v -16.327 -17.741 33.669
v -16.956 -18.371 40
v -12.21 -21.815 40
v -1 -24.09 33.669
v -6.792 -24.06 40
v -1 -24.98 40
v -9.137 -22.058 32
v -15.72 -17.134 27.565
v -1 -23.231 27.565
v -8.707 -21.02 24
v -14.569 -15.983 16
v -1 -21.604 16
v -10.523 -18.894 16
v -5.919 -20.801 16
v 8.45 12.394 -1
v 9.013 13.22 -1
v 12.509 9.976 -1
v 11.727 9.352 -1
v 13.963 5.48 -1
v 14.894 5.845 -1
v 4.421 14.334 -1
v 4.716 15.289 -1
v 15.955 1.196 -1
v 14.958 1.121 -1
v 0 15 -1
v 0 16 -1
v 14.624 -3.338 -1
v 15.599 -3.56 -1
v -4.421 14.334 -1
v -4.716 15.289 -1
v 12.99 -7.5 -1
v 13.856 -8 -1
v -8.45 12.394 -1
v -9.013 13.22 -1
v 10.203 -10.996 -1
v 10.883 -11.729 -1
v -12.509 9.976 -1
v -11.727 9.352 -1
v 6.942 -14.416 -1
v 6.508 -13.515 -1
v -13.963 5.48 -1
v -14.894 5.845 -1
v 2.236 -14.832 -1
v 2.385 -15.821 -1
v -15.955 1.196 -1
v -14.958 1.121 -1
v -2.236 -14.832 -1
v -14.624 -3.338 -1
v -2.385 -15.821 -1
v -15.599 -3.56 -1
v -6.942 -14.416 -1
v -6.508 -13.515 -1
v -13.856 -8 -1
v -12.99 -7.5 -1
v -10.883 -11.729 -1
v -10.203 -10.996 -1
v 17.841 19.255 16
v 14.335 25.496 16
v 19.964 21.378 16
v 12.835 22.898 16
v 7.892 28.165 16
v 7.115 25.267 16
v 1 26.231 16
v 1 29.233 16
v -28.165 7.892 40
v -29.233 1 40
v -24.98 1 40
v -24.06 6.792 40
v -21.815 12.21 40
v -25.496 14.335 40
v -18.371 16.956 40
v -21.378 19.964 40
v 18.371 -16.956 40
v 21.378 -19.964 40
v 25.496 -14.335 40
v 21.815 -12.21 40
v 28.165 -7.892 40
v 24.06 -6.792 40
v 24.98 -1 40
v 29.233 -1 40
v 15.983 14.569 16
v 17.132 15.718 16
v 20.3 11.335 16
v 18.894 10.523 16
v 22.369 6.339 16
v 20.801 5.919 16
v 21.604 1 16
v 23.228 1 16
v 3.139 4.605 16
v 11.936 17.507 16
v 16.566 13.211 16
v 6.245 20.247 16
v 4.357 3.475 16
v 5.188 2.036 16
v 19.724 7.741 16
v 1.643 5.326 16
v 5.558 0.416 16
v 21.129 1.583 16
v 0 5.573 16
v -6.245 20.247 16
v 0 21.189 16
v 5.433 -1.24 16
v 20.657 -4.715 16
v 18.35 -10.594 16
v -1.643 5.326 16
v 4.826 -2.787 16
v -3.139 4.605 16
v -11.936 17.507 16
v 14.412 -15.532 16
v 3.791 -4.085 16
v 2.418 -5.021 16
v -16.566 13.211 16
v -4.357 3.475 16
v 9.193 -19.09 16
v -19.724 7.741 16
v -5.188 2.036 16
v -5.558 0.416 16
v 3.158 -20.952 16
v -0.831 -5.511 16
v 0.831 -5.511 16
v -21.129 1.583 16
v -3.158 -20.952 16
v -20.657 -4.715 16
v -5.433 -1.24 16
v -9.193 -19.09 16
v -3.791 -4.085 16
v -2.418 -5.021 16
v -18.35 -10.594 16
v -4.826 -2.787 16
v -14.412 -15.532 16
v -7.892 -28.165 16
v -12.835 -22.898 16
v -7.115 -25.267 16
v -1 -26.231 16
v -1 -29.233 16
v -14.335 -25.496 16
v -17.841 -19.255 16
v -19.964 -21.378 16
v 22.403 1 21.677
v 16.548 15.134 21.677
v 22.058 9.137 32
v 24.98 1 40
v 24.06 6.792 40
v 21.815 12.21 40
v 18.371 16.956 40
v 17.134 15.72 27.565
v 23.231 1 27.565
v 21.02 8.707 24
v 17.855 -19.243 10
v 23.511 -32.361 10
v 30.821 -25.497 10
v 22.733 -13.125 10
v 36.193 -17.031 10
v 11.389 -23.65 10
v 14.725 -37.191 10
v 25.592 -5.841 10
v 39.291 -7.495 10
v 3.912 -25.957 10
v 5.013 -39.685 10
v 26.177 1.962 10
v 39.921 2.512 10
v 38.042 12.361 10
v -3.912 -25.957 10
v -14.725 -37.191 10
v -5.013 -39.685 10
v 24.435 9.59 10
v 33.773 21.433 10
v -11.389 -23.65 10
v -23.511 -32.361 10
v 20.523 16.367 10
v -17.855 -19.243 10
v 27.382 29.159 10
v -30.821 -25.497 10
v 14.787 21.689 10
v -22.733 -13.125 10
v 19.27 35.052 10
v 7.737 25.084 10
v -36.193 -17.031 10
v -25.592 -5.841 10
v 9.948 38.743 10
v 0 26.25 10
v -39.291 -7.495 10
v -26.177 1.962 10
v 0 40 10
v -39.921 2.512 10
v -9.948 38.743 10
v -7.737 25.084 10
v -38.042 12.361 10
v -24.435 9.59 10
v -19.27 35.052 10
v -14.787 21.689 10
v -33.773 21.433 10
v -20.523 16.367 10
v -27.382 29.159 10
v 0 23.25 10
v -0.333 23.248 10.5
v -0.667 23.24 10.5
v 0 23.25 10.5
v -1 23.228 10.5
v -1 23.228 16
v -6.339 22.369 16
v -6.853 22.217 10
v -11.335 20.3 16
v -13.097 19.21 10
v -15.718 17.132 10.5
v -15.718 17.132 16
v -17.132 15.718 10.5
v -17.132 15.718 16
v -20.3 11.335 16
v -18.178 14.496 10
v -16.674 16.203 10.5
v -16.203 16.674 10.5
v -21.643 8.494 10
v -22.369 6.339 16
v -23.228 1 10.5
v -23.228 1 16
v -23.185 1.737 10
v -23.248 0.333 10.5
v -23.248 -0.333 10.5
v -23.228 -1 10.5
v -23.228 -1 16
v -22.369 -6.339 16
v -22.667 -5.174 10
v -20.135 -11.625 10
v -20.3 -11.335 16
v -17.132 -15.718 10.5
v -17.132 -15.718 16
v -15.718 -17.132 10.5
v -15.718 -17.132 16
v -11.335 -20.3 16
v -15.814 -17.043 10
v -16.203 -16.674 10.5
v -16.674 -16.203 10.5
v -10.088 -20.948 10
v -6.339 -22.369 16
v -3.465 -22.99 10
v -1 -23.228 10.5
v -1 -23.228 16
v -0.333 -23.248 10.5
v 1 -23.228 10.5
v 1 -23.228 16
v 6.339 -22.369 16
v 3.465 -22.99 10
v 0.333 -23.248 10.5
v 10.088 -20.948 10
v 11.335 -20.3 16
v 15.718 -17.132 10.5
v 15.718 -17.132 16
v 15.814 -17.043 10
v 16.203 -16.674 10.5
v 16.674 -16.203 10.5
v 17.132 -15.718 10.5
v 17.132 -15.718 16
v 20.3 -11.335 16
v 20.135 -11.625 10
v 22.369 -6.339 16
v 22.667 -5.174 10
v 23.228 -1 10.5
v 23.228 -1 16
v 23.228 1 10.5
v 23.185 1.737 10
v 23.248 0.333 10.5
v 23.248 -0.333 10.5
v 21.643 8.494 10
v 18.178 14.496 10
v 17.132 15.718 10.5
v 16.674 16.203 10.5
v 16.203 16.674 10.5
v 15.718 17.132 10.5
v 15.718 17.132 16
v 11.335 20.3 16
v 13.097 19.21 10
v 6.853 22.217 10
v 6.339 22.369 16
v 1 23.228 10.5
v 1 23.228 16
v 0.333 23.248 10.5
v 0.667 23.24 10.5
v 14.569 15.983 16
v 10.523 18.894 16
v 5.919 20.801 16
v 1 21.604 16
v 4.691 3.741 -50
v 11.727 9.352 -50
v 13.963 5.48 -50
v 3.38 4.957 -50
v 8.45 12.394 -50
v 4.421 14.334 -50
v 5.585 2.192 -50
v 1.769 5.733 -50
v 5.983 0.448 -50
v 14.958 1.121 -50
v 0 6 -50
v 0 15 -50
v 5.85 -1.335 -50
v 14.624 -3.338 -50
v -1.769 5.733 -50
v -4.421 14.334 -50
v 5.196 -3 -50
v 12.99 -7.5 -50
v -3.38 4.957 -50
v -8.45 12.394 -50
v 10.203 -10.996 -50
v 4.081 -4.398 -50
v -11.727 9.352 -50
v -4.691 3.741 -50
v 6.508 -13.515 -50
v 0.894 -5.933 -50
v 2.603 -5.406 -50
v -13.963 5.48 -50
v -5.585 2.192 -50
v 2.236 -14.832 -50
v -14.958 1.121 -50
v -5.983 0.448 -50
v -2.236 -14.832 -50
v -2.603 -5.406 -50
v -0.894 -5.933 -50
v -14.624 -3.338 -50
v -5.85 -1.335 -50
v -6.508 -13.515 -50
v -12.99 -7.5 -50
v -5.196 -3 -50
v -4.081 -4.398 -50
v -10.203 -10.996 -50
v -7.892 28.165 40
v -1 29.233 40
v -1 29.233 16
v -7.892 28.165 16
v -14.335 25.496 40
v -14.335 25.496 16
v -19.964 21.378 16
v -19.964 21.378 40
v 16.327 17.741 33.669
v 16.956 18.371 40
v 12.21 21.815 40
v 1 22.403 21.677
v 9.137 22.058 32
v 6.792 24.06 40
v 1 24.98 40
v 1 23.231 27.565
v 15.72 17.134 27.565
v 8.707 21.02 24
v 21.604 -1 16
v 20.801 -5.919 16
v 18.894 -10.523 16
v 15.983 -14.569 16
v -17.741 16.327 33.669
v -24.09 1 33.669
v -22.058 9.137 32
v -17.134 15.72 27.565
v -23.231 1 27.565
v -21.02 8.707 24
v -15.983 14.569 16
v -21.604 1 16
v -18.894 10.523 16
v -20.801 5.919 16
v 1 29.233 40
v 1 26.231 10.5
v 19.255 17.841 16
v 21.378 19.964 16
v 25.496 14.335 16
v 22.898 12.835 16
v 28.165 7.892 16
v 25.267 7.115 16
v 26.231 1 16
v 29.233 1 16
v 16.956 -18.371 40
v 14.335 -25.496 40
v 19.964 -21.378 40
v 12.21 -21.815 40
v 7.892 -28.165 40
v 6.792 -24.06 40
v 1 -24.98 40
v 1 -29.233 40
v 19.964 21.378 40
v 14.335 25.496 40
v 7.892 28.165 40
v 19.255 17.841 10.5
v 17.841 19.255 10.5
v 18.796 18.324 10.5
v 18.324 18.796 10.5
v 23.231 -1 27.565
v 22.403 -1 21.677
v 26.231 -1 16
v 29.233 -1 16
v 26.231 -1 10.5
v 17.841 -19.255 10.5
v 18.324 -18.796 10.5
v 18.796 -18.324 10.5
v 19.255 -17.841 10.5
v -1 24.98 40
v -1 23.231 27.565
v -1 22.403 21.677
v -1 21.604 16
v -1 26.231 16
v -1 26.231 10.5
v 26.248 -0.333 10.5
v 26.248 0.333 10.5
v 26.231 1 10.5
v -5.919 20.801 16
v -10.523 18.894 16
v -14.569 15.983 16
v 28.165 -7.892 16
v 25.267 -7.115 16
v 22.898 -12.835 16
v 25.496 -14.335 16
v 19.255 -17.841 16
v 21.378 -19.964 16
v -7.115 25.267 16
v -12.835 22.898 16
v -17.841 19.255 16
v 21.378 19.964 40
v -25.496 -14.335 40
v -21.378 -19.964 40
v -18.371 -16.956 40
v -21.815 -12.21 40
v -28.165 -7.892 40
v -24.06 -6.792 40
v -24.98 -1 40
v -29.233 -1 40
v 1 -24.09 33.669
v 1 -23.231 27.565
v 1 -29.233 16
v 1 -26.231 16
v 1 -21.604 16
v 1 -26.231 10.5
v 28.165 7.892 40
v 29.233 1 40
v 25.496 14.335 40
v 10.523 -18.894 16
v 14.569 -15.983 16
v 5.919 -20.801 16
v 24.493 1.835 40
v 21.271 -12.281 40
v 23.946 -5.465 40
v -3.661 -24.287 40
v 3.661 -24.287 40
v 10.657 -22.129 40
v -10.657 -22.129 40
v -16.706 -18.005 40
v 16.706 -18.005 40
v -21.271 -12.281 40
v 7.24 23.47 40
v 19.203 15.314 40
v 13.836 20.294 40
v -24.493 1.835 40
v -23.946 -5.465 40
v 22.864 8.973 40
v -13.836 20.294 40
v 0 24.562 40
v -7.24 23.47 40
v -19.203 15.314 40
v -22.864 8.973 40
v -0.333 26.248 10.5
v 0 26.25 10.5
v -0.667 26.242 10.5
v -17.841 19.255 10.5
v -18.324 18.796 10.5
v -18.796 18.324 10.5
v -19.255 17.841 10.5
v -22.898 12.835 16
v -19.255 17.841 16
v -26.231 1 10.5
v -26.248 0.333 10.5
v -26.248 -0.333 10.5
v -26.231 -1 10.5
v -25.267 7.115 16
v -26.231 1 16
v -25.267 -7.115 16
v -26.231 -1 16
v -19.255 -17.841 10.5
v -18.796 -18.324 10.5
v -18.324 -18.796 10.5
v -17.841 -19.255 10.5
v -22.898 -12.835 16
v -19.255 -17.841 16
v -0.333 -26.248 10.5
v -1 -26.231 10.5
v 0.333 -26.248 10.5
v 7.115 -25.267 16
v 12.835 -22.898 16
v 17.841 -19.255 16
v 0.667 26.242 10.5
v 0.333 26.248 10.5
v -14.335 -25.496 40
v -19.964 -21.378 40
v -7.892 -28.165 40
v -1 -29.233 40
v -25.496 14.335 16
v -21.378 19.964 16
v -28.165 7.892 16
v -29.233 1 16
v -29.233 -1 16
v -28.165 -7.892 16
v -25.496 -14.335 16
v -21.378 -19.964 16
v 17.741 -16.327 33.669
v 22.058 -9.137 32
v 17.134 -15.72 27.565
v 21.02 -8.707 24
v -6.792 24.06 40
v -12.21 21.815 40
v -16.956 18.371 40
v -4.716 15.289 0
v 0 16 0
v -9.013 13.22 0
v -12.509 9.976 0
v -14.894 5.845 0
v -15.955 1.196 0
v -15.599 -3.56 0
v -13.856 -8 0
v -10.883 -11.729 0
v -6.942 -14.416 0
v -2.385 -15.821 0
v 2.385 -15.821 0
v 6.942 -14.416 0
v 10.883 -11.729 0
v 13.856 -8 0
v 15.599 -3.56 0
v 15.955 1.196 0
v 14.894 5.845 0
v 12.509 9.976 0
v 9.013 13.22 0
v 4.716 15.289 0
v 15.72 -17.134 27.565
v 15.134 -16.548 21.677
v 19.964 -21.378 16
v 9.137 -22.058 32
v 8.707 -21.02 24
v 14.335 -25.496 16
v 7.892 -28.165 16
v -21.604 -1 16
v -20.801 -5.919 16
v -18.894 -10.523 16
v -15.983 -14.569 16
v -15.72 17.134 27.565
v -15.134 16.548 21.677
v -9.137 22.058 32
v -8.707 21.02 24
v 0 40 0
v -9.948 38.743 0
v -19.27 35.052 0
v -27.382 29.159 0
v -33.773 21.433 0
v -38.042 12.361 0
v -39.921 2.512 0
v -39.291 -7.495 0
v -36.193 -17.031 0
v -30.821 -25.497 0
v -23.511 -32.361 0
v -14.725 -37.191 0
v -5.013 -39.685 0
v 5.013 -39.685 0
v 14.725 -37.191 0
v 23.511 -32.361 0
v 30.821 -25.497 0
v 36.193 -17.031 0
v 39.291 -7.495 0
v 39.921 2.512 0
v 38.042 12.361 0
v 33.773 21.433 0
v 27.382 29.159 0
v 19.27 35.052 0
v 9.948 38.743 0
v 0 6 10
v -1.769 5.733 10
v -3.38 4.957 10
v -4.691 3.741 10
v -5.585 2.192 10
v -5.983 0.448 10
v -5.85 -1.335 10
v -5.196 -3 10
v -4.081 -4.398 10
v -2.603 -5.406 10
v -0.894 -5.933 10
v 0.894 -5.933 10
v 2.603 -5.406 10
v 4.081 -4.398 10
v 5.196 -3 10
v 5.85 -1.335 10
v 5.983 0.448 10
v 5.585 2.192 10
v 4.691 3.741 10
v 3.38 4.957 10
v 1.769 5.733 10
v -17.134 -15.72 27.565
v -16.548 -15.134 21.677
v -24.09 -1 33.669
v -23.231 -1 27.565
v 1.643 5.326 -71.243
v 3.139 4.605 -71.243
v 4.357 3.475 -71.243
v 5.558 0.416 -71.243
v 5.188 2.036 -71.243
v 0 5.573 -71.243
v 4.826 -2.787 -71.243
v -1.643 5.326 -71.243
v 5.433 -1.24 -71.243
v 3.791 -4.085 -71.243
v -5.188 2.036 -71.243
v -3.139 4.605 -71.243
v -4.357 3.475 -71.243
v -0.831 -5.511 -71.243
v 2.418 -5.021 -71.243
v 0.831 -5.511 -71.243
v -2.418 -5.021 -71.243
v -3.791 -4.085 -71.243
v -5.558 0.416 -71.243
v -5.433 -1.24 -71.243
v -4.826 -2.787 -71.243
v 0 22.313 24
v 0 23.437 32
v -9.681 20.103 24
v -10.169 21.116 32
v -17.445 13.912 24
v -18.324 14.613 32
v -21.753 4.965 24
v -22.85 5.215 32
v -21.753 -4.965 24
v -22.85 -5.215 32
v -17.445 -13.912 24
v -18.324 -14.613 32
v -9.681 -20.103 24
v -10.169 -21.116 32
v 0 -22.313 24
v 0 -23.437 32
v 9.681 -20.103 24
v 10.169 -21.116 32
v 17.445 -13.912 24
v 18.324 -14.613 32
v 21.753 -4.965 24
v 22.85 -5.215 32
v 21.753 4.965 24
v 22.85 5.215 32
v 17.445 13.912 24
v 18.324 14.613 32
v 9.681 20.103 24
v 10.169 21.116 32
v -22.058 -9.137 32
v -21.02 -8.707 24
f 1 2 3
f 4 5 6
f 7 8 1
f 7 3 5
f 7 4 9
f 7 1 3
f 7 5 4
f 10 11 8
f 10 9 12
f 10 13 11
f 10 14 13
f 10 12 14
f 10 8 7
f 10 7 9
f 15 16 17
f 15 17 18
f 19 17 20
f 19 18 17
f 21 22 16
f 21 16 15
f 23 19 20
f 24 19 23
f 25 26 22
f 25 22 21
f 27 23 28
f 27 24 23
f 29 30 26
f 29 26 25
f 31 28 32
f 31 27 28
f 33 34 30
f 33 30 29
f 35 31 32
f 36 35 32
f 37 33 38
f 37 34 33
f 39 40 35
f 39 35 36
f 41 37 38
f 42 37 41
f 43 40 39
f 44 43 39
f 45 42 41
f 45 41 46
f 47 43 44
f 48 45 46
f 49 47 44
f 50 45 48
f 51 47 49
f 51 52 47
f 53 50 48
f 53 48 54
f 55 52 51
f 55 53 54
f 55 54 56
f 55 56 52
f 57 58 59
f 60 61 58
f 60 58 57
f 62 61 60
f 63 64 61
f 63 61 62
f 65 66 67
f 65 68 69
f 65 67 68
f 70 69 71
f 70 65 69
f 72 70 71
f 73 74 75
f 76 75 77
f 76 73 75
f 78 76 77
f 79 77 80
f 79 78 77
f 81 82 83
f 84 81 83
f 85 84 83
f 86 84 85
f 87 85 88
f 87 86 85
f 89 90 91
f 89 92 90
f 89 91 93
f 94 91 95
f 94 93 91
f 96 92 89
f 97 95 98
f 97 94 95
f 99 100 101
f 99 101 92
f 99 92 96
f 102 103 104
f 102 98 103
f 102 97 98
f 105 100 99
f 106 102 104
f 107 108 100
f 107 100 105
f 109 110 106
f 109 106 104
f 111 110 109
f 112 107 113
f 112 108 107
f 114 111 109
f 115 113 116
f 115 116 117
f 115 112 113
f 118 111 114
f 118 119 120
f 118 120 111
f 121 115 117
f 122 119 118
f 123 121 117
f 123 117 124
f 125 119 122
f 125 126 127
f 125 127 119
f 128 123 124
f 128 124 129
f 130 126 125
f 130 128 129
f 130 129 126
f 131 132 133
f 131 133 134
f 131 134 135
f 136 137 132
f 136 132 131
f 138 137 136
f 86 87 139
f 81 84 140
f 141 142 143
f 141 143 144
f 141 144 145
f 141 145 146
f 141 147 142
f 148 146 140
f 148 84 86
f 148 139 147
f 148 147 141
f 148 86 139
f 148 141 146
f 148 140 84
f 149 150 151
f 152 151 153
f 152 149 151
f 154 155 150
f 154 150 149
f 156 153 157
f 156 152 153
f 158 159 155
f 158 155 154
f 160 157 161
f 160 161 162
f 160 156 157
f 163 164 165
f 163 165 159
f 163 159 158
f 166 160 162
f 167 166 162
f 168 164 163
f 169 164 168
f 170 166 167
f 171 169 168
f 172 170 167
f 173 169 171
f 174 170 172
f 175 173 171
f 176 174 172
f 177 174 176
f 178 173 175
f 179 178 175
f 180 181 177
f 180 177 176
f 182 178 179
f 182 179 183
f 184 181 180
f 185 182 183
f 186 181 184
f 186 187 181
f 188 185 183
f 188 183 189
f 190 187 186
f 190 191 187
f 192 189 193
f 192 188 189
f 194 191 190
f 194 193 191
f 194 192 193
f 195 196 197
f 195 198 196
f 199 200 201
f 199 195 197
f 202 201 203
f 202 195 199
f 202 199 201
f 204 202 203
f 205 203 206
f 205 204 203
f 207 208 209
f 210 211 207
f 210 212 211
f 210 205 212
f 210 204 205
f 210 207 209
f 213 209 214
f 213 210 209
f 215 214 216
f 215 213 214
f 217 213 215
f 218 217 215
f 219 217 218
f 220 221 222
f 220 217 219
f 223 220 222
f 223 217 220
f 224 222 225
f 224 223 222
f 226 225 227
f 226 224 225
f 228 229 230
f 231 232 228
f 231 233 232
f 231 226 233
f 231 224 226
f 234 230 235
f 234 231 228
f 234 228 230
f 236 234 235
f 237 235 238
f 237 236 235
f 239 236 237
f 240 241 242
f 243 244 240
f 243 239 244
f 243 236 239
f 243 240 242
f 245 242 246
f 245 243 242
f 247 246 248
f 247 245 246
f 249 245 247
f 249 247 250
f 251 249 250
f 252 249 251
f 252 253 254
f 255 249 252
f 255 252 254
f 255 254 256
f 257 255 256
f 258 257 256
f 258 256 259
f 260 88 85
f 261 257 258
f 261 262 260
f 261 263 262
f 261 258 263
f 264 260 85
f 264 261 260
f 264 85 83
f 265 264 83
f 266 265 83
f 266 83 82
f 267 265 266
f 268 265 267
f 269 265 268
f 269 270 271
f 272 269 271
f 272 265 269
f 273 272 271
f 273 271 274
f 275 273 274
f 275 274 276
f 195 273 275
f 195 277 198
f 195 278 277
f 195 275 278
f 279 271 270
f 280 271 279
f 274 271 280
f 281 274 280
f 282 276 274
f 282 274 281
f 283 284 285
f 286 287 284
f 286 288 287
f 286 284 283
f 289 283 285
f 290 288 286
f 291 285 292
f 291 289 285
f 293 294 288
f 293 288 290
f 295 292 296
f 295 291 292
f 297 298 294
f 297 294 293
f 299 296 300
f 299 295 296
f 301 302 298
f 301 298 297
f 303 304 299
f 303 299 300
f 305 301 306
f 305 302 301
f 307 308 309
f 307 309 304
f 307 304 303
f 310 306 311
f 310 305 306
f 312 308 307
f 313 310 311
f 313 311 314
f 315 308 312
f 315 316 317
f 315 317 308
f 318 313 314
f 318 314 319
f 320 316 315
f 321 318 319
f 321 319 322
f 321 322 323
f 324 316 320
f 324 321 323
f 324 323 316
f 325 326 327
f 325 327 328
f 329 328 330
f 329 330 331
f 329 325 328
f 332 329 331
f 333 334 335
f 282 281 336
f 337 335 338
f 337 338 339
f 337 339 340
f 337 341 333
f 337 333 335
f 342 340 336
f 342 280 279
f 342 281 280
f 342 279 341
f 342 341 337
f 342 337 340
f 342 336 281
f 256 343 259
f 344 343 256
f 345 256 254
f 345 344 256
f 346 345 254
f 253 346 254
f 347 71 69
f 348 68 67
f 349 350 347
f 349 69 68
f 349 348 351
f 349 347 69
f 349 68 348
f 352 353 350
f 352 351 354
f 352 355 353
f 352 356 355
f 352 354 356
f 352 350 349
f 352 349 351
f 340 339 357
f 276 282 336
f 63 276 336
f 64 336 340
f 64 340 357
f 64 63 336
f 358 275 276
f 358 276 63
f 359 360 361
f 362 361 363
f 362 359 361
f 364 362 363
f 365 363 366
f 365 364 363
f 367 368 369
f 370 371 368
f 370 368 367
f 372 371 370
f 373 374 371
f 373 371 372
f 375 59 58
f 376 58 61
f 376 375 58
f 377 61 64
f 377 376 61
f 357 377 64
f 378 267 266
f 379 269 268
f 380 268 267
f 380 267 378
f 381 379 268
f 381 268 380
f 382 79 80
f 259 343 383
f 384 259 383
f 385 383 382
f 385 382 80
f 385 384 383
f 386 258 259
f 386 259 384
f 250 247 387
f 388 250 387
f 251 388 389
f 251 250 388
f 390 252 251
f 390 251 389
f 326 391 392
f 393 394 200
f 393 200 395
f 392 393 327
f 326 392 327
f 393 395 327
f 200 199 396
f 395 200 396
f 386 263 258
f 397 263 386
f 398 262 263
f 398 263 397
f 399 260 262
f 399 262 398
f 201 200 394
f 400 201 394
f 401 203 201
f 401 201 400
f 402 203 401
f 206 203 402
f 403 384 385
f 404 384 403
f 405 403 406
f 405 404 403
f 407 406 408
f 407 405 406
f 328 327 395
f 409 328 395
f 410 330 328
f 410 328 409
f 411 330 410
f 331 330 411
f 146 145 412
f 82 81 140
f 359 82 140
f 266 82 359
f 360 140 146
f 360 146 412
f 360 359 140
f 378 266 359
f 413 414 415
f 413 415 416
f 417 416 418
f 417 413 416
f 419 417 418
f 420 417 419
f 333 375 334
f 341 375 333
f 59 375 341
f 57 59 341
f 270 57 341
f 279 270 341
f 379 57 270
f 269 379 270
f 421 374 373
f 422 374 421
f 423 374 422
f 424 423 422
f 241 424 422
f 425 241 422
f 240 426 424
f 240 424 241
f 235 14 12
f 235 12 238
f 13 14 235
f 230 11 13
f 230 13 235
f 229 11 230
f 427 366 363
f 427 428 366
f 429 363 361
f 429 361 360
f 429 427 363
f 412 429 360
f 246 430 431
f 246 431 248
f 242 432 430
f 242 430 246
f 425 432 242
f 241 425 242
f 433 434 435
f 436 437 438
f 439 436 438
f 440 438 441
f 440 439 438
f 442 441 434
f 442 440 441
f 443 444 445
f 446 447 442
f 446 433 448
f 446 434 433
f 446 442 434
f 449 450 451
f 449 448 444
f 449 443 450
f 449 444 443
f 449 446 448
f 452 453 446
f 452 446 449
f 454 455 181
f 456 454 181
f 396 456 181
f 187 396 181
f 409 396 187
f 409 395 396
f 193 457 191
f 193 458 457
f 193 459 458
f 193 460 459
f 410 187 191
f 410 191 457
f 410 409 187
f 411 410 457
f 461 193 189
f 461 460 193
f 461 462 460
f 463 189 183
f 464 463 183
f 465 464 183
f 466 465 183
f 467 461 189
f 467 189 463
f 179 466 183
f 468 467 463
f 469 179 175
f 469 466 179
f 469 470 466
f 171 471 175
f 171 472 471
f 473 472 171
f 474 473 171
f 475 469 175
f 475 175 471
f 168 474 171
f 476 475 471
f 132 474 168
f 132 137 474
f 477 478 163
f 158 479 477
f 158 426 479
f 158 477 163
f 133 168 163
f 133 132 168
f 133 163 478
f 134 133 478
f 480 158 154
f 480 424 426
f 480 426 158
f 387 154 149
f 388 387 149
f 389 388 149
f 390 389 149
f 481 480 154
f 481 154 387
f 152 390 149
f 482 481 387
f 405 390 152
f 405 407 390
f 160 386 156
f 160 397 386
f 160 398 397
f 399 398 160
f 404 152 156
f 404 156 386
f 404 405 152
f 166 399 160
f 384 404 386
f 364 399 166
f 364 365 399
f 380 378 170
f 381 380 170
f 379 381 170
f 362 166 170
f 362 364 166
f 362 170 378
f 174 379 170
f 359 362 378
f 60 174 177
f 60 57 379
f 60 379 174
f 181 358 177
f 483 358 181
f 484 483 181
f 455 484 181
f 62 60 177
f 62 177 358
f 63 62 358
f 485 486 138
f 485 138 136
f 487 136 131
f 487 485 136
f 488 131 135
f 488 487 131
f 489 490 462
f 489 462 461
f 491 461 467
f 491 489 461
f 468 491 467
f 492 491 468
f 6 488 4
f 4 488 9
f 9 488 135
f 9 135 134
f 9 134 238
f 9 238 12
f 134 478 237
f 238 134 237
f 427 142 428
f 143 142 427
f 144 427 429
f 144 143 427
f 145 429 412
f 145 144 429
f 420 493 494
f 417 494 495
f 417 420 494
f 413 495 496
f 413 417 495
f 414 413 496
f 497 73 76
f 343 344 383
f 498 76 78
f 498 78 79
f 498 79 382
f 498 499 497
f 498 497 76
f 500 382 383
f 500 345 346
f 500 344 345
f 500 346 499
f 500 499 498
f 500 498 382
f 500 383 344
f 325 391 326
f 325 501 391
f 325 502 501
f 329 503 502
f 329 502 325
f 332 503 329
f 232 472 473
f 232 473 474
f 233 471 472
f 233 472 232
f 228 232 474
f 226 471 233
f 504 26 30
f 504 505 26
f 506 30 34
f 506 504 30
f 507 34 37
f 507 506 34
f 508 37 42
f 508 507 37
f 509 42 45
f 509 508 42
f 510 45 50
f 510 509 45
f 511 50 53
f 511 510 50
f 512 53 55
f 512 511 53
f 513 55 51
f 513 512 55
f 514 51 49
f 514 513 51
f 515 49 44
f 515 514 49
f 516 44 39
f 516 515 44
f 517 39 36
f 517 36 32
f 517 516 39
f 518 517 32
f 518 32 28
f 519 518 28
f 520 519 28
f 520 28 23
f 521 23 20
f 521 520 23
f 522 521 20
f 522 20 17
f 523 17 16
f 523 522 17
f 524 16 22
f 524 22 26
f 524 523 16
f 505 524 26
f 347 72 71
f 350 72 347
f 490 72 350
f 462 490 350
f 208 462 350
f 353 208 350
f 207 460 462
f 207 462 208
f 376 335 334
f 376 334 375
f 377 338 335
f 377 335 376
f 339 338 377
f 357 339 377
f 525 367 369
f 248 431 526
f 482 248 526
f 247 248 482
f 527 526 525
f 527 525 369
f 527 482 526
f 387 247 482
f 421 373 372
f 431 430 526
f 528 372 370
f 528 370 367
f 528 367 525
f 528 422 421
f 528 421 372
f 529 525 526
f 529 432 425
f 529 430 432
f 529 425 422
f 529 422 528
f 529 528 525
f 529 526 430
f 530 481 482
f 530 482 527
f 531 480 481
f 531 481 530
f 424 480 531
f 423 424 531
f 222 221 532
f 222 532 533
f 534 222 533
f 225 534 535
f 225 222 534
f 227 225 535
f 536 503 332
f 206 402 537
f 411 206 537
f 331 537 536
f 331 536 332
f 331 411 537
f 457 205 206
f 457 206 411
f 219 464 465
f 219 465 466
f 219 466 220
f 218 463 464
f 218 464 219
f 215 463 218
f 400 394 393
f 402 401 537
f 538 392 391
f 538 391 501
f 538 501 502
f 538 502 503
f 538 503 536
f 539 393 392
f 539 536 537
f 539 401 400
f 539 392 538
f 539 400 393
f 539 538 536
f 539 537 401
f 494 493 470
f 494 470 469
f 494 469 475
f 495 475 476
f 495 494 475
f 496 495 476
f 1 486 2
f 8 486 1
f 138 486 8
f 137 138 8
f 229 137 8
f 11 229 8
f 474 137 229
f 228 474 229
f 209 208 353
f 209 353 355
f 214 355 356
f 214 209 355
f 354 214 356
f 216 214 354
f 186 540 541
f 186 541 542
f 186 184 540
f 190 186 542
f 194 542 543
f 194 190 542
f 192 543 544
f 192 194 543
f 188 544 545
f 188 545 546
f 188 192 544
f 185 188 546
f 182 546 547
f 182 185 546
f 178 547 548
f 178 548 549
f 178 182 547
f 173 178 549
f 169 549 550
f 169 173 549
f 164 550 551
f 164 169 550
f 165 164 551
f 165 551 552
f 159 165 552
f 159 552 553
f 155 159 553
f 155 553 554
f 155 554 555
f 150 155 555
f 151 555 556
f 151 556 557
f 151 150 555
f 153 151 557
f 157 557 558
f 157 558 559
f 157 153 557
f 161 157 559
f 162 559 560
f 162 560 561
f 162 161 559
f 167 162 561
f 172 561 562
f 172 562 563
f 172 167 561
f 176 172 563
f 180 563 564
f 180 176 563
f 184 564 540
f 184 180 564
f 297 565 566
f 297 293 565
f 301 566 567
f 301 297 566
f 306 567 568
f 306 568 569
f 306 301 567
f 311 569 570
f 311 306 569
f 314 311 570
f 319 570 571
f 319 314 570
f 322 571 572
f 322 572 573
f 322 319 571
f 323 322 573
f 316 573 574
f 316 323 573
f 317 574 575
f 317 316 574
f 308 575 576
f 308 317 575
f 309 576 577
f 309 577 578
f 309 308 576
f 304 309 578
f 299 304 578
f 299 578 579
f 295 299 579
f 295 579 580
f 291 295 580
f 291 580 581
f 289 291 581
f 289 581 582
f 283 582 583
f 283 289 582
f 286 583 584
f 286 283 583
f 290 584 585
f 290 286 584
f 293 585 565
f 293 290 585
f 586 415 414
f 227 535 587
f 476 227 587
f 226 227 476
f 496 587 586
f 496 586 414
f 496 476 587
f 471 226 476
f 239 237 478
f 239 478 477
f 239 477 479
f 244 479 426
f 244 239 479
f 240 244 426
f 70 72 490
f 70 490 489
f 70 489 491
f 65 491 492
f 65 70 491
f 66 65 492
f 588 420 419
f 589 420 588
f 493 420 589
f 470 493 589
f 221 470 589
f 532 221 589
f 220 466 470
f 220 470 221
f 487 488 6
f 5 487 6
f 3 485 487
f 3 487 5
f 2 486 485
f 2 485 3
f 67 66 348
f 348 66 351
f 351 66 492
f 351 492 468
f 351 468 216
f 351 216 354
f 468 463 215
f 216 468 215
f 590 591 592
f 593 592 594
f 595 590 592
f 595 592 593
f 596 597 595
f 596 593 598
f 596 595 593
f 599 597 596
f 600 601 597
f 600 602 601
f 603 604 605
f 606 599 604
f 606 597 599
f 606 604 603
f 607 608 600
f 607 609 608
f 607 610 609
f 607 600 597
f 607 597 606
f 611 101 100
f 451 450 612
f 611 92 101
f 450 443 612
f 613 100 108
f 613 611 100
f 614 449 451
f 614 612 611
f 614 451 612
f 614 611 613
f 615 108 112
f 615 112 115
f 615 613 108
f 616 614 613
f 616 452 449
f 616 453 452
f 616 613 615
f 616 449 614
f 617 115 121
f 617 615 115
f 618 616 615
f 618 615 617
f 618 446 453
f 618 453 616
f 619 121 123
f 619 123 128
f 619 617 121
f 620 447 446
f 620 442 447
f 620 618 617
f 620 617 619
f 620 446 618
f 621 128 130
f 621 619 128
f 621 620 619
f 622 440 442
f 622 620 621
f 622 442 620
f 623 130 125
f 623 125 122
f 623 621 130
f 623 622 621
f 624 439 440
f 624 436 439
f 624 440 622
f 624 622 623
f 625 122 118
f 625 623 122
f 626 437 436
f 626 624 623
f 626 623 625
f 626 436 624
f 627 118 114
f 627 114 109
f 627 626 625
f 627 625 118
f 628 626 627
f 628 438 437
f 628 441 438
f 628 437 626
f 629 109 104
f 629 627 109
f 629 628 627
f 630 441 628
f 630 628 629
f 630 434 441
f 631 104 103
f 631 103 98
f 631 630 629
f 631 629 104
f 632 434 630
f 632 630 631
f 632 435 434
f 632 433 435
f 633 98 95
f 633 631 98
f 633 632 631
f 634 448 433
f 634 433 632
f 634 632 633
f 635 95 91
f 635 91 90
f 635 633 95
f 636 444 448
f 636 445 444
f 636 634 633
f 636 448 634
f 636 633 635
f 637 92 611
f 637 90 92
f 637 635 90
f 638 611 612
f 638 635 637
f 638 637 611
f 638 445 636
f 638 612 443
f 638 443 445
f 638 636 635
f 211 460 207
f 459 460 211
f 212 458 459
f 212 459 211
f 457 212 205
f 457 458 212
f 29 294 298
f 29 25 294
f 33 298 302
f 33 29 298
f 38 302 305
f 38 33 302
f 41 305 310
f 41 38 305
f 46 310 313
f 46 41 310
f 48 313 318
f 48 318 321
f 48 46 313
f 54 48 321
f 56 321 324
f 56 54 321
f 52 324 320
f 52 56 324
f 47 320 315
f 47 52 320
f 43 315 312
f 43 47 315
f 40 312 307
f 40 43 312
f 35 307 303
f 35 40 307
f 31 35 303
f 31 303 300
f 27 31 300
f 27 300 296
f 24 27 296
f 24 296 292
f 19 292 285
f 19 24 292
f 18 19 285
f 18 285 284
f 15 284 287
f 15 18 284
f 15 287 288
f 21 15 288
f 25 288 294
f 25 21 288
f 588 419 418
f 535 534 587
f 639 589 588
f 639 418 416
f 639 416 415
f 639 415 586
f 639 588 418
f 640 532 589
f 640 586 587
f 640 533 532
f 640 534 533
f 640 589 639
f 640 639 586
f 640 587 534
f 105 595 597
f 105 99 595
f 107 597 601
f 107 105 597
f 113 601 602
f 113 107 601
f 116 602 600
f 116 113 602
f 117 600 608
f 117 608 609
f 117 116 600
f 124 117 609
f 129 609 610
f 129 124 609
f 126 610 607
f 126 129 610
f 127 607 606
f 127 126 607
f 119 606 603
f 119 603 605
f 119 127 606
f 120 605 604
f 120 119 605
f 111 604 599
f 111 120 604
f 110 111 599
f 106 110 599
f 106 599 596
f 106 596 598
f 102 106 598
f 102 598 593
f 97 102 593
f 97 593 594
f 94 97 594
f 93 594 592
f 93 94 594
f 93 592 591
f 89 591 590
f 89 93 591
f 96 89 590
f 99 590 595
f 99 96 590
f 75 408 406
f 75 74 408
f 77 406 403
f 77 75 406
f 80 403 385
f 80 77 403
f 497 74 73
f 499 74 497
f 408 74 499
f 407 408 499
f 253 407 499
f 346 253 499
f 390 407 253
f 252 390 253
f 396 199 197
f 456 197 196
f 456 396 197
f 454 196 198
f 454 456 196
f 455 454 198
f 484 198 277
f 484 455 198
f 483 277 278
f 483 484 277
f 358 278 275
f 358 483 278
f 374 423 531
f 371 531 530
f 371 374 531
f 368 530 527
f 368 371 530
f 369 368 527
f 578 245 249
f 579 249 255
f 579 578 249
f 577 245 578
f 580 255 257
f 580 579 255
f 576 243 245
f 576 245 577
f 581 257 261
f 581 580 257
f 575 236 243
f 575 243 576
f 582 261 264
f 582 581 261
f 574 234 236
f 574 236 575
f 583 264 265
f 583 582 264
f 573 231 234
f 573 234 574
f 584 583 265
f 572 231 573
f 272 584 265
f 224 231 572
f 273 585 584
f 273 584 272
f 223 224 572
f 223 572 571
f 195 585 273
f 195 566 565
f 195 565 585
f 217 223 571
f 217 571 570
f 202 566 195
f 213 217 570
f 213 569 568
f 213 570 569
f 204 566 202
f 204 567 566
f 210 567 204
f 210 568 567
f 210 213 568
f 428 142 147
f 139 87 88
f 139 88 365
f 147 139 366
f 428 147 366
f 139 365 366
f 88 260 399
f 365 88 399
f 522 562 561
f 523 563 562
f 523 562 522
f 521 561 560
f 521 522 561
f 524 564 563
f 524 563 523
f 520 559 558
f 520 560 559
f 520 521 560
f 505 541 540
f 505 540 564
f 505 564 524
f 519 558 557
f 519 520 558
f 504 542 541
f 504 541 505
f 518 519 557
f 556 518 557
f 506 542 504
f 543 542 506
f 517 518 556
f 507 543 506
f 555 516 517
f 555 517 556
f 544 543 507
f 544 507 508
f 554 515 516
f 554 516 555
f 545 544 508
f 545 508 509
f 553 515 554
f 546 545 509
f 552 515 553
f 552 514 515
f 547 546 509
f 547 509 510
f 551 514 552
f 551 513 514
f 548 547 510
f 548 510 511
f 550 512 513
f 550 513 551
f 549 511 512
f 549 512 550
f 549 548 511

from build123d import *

# Parameters (mm, degrees)
F3_W     = 34.08392
F3_H     = 2
F3_W_2   = 2
F3_H_2   = 34.08392
F4_DEPTH = 29.5


with BuildPart() as f1:
    # F0 (on Right) → F1 (revolve)
    with BuildSketch(Plane.YZ):
        Polygon((6, 10), (6, -50), (15, -50), (15, -1), (16, -1), (16, 0), (40, 0), (40, 10), (26.25, 10), (26.25, 16), (29.25, 16), (29.25, 40), (25, 40), (21.62702, 16), (23.25, 16), (23.25, 10), align=None)
    revolve(axis=Axis((0, 0, -5), (0, 0, 1)))

    # F3 (on offset) → F4 (cut, through all)
    with BuildSketch(Plane.XY.offset(10.5)):
        with Locations((-22.95804, 0)):
            Rectangle(F3_W, F3_H)
        Polygon((-4.890407, -3.476193), (-28.991378, -27.577164), (-27.577164, -28.991378), (-3.476193, -4.890407), align=None)
        with Locations((0, -22.95804)):
            Rectangle(F3_W_2, F3_H_2)
        Polygon((3.476193, -4.890407), (27.577164, -28.991378), (28.991378, -27.577164), (4.890407, -3.476193), align=None)
        with Locations((22.95804, 0)):
            Rectangle(F3_W, F3_H)
        Polygon((4.890407, 3.476193), (28.991378, 27.577164), (27.577164, 28.991378), (3.476193, 4.890407), align=None)
        with Locations((0, 22.95804)):
            Rectangle(F3_W_2, F3_H_2)
        Polygon((-3.476193, 4.890407), (-27.577164, 28.991378), (-28.991378, 27.577164), (-4.890407, 3.476193), align=None)
    extrude(amount=F4_DEPTH, mode=Mode.SUBTRACT)


with BuildPart() as f6:
    # F5 (on Right) → F6 (revolve)
    with BuildSketch(Plane.YZ):
        Polygon((24.561521, 40), (0, 40), (0, -71.243197), (5.573114, -71.243197), (5.573114, 16), (21.188541, 16), align=None)
    revolve(axis=Axis((0, 0, -15.621598), (0, 0, 1)))


solid = Compound([f1.part, f6.part])
